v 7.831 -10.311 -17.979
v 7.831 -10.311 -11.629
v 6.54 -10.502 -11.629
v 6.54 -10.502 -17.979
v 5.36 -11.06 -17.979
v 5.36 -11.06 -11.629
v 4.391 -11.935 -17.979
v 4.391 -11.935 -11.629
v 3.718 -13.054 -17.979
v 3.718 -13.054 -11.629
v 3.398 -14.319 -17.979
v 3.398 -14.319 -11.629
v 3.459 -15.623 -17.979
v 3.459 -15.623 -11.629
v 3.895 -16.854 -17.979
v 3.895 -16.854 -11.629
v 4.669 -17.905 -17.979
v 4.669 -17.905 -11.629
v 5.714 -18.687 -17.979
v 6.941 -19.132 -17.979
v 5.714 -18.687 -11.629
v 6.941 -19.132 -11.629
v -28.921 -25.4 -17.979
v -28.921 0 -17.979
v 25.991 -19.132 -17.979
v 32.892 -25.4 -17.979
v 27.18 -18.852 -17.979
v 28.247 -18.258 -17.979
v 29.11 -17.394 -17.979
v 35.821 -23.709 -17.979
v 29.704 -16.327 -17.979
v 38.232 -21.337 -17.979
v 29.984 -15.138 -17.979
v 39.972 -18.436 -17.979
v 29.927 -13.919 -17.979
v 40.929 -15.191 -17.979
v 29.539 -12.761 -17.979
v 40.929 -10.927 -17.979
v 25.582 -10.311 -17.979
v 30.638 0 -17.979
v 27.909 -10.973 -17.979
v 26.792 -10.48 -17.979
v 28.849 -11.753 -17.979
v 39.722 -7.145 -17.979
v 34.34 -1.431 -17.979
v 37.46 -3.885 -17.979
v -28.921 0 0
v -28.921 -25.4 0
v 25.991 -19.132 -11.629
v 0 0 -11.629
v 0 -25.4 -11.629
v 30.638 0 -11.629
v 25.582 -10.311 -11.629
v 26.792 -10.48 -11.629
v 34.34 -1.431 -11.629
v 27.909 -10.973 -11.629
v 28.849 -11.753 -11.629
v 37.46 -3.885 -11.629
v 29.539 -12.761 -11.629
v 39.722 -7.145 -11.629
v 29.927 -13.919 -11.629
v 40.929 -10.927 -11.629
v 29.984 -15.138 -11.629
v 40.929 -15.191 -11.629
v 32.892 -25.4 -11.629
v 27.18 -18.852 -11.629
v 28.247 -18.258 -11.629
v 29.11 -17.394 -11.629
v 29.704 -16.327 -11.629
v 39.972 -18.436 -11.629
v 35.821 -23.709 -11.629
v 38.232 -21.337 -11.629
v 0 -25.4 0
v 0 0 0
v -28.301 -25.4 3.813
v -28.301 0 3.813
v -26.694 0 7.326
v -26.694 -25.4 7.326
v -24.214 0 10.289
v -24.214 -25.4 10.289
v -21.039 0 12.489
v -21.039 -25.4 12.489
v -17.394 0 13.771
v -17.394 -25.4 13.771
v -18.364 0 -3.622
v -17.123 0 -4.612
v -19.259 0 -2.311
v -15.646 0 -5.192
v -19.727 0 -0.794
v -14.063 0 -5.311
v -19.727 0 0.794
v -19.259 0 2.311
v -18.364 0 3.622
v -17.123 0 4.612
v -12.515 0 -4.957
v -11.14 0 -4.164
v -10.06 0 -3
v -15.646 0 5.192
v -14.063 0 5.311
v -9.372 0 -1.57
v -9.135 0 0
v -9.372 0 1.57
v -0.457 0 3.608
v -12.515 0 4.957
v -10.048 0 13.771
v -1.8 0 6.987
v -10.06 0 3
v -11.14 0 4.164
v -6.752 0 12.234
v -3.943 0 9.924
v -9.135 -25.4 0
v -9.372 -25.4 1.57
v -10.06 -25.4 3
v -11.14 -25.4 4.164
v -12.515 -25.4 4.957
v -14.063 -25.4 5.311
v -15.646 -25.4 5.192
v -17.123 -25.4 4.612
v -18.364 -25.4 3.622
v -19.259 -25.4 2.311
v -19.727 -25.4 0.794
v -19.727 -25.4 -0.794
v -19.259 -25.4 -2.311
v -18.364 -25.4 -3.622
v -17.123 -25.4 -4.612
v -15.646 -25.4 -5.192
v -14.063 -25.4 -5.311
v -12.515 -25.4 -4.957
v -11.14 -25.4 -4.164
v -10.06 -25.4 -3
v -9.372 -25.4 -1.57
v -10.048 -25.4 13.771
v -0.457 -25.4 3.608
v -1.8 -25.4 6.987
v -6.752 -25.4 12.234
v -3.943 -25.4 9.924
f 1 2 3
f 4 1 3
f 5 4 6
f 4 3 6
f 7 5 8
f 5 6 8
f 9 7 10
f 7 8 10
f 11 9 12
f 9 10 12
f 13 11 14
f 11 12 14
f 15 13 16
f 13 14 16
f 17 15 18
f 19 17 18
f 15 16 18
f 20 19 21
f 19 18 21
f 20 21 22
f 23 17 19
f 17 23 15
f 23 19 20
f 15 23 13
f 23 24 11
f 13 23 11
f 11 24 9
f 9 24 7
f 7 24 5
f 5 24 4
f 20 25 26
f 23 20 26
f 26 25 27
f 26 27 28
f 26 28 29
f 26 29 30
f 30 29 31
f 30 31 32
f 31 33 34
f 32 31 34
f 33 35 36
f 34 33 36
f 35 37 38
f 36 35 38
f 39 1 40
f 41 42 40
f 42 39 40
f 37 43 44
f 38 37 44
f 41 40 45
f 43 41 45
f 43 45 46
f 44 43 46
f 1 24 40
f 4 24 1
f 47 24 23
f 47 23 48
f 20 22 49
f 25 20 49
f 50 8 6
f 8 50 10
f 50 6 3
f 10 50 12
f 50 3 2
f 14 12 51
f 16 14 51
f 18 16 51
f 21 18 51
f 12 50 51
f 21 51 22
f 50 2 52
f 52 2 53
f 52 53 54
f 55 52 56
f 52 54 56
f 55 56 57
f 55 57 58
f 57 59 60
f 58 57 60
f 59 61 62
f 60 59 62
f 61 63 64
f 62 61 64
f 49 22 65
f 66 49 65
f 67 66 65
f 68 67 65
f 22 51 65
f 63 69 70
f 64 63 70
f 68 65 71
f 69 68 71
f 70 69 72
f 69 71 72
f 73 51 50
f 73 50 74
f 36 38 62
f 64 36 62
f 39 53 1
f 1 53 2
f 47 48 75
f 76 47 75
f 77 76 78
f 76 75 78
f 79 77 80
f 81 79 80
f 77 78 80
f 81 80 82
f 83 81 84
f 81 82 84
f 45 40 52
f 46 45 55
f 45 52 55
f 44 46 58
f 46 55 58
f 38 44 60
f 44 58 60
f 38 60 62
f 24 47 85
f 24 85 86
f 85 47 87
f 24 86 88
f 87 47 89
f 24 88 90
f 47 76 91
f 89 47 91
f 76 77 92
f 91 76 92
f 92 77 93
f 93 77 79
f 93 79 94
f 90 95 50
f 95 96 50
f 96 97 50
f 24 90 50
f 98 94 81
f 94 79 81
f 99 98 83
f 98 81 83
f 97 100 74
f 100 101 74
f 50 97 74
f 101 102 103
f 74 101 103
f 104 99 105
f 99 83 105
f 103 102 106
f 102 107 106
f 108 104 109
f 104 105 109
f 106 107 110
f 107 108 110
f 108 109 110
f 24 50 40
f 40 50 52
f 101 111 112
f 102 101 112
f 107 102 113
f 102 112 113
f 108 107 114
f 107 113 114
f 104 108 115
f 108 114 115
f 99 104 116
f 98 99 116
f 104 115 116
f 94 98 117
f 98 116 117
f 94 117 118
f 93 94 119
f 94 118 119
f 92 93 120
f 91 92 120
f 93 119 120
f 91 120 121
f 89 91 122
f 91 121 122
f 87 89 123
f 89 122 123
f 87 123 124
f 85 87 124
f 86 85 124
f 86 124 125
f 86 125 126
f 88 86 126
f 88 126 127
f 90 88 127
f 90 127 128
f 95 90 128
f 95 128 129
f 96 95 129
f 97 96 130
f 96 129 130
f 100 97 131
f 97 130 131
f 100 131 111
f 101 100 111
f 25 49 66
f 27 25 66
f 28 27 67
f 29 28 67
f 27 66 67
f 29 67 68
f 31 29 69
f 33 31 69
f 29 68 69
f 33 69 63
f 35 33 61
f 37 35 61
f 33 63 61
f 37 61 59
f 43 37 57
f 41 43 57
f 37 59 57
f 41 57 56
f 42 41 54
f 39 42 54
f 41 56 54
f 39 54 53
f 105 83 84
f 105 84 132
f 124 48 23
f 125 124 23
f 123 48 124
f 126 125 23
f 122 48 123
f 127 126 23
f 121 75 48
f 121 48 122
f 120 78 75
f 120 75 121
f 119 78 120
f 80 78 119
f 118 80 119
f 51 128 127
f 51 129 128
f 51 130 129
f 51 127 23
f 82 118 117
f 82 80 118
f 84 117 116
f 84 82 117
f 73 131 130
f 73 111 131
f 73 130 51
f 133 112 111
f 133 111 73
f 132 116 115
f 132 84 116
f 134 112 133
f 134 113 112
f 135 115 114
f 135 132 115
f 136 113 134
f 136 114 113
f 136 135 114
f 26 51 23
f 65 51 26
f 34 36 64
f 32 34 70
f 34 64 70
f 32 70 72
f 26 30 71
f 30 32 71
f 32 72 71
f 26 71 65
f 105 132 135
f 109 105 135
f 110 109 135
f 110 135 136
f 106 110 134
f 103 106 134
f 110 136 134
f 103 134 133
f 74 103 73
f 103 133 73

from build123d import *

# Parameters (mm, degrees)
F0_W      = 69.85
F0_H      = 31.75
F1_DEPTH  = 25.4
F3_DEPTH  = 25.4
F4_W      = 40.9290131211
F4_H      = 25.4
F5_DEPTH  = 25.4
F7_DEPTH  = 25.4
F9_DEPTH  = 25.4
F11_DEPTH = 25.4
F12_R     = 5.3255513917
F13_DEPTH = 25.4


with BuildPart() as f1:
    # F0 (on Front) → F1 (new body)
    with BuildSketch(Plane.XZ):
        with Locations((6.0040131211, -2.1042692847)):
            Rectangle(F0_W, F0_H)
    extrude(amount=F1_DEPTH)

    # F2 (on face) → F3 (cut)
    with BuildSketch(Plane.XZ.offset(25.4)):
        with BuildLine():
            ThreePointArc((-28.9209868789, 0), (-25.5531384198, 8.8906260106), (-17.3940813557, 13.7707307153))
            Line((-17.3940813557, 13.7707307153), (-28.9209868789, 13.7707307153))
            Line((-28.9209868789, 13.7707307153), (-28.9209868789, 0))
        make_face()
    extrude(amount=-F3_DEPTH, mode=Mode.SUBTRACT)

    # F4 (on face) → F5 (cut)
    with BuildSketch(Plane.XZ.offset(25.4)):
        with Locations((20.4645065606, 1.0707307153)):
            Rectangle(F4_W, F4_H)
    extrude(amount=-F5_DEPTH, mode=Mode.SUBTRACT)

    # F6 (on face) → F7 (cut)
    with BuildSketch(Plane.XZ.offset(25.4)):
        with BuildLine():
            ThreePointArc((-10.0476886535, 13.7707307153), (-2.7789437741, 8.5233366664), (0, 0))
            Line((0, 0), (0, 13.7707307153))
            Line((0, 13.7707307153), (-10.0476886535, 13.7707307153))
        make_face()
    extrude(amount=-F7_DEPTH, mode=Mode.SUBTRACT)

    # F8 (on face) → F9 (cut)
    with BuildSketch(Plane.XY.offset(-11.6292692847)):
        with BuildLine():
            ThreePointArc((40.9290131211, -15.1913341976), (38.2324702051, -21.3366480861), (32.8915528953, -25.4))
            Line((32.8915528953, -25.4), (40.9290131211, -25.4))
            Line((40.9290131211, -25.4), (40.9290131211, -15.1913341976))
        make_face()
        with BuildLine():
            ThreePointArc((30.6381783403, 0), (37.4598520862, -3.8845668164), (40.9290131211, -10.92658455))
            Line((40.9290131211, -10.92658455), (40.9290131211, 0))
            Line((40.9290131211, 0), (30.6381783403, 0))
        make_face()
    extrude(amount=-F9_DEPTH, mode=Mode.SUBTRACT)

    # F10 (on face) → F11 (cut)
    with BuildSketch(Plane.XY.offset(-11.6292692847)):
        with BuildLine():
            Line((6.9414059162, -19.1323067701), (25.9914059162, -19.1323067701))
            ThreePointArc((25.9914059162, -19.1323067701), (29.9975909424, -14.5264953928), (25.5823172629, -10.3112403303))
            Line((25.5823172629, -10.3112403303), (7.8313201666, -10.3112403303))
            ThreePointArc((7.8313201666, -10.3112403303), (3.3983989935, -14.319447362), (6.9414059162, -19.1323067701))
        make_face()
    extrude(amount=-F11_DEPTH, mode=Mode.SUBTRACT)

    # F12 (on face) → F13 (cut)
    with BuildSketch(Plane.XZ.offset(25.4)):
        with Locations((-14.4604934394, 0)):
            Circle(F12_R)
    extrude(amount=-F13_DEPTH, mode=Mode.SUBTRACT)


solid = f1.part
